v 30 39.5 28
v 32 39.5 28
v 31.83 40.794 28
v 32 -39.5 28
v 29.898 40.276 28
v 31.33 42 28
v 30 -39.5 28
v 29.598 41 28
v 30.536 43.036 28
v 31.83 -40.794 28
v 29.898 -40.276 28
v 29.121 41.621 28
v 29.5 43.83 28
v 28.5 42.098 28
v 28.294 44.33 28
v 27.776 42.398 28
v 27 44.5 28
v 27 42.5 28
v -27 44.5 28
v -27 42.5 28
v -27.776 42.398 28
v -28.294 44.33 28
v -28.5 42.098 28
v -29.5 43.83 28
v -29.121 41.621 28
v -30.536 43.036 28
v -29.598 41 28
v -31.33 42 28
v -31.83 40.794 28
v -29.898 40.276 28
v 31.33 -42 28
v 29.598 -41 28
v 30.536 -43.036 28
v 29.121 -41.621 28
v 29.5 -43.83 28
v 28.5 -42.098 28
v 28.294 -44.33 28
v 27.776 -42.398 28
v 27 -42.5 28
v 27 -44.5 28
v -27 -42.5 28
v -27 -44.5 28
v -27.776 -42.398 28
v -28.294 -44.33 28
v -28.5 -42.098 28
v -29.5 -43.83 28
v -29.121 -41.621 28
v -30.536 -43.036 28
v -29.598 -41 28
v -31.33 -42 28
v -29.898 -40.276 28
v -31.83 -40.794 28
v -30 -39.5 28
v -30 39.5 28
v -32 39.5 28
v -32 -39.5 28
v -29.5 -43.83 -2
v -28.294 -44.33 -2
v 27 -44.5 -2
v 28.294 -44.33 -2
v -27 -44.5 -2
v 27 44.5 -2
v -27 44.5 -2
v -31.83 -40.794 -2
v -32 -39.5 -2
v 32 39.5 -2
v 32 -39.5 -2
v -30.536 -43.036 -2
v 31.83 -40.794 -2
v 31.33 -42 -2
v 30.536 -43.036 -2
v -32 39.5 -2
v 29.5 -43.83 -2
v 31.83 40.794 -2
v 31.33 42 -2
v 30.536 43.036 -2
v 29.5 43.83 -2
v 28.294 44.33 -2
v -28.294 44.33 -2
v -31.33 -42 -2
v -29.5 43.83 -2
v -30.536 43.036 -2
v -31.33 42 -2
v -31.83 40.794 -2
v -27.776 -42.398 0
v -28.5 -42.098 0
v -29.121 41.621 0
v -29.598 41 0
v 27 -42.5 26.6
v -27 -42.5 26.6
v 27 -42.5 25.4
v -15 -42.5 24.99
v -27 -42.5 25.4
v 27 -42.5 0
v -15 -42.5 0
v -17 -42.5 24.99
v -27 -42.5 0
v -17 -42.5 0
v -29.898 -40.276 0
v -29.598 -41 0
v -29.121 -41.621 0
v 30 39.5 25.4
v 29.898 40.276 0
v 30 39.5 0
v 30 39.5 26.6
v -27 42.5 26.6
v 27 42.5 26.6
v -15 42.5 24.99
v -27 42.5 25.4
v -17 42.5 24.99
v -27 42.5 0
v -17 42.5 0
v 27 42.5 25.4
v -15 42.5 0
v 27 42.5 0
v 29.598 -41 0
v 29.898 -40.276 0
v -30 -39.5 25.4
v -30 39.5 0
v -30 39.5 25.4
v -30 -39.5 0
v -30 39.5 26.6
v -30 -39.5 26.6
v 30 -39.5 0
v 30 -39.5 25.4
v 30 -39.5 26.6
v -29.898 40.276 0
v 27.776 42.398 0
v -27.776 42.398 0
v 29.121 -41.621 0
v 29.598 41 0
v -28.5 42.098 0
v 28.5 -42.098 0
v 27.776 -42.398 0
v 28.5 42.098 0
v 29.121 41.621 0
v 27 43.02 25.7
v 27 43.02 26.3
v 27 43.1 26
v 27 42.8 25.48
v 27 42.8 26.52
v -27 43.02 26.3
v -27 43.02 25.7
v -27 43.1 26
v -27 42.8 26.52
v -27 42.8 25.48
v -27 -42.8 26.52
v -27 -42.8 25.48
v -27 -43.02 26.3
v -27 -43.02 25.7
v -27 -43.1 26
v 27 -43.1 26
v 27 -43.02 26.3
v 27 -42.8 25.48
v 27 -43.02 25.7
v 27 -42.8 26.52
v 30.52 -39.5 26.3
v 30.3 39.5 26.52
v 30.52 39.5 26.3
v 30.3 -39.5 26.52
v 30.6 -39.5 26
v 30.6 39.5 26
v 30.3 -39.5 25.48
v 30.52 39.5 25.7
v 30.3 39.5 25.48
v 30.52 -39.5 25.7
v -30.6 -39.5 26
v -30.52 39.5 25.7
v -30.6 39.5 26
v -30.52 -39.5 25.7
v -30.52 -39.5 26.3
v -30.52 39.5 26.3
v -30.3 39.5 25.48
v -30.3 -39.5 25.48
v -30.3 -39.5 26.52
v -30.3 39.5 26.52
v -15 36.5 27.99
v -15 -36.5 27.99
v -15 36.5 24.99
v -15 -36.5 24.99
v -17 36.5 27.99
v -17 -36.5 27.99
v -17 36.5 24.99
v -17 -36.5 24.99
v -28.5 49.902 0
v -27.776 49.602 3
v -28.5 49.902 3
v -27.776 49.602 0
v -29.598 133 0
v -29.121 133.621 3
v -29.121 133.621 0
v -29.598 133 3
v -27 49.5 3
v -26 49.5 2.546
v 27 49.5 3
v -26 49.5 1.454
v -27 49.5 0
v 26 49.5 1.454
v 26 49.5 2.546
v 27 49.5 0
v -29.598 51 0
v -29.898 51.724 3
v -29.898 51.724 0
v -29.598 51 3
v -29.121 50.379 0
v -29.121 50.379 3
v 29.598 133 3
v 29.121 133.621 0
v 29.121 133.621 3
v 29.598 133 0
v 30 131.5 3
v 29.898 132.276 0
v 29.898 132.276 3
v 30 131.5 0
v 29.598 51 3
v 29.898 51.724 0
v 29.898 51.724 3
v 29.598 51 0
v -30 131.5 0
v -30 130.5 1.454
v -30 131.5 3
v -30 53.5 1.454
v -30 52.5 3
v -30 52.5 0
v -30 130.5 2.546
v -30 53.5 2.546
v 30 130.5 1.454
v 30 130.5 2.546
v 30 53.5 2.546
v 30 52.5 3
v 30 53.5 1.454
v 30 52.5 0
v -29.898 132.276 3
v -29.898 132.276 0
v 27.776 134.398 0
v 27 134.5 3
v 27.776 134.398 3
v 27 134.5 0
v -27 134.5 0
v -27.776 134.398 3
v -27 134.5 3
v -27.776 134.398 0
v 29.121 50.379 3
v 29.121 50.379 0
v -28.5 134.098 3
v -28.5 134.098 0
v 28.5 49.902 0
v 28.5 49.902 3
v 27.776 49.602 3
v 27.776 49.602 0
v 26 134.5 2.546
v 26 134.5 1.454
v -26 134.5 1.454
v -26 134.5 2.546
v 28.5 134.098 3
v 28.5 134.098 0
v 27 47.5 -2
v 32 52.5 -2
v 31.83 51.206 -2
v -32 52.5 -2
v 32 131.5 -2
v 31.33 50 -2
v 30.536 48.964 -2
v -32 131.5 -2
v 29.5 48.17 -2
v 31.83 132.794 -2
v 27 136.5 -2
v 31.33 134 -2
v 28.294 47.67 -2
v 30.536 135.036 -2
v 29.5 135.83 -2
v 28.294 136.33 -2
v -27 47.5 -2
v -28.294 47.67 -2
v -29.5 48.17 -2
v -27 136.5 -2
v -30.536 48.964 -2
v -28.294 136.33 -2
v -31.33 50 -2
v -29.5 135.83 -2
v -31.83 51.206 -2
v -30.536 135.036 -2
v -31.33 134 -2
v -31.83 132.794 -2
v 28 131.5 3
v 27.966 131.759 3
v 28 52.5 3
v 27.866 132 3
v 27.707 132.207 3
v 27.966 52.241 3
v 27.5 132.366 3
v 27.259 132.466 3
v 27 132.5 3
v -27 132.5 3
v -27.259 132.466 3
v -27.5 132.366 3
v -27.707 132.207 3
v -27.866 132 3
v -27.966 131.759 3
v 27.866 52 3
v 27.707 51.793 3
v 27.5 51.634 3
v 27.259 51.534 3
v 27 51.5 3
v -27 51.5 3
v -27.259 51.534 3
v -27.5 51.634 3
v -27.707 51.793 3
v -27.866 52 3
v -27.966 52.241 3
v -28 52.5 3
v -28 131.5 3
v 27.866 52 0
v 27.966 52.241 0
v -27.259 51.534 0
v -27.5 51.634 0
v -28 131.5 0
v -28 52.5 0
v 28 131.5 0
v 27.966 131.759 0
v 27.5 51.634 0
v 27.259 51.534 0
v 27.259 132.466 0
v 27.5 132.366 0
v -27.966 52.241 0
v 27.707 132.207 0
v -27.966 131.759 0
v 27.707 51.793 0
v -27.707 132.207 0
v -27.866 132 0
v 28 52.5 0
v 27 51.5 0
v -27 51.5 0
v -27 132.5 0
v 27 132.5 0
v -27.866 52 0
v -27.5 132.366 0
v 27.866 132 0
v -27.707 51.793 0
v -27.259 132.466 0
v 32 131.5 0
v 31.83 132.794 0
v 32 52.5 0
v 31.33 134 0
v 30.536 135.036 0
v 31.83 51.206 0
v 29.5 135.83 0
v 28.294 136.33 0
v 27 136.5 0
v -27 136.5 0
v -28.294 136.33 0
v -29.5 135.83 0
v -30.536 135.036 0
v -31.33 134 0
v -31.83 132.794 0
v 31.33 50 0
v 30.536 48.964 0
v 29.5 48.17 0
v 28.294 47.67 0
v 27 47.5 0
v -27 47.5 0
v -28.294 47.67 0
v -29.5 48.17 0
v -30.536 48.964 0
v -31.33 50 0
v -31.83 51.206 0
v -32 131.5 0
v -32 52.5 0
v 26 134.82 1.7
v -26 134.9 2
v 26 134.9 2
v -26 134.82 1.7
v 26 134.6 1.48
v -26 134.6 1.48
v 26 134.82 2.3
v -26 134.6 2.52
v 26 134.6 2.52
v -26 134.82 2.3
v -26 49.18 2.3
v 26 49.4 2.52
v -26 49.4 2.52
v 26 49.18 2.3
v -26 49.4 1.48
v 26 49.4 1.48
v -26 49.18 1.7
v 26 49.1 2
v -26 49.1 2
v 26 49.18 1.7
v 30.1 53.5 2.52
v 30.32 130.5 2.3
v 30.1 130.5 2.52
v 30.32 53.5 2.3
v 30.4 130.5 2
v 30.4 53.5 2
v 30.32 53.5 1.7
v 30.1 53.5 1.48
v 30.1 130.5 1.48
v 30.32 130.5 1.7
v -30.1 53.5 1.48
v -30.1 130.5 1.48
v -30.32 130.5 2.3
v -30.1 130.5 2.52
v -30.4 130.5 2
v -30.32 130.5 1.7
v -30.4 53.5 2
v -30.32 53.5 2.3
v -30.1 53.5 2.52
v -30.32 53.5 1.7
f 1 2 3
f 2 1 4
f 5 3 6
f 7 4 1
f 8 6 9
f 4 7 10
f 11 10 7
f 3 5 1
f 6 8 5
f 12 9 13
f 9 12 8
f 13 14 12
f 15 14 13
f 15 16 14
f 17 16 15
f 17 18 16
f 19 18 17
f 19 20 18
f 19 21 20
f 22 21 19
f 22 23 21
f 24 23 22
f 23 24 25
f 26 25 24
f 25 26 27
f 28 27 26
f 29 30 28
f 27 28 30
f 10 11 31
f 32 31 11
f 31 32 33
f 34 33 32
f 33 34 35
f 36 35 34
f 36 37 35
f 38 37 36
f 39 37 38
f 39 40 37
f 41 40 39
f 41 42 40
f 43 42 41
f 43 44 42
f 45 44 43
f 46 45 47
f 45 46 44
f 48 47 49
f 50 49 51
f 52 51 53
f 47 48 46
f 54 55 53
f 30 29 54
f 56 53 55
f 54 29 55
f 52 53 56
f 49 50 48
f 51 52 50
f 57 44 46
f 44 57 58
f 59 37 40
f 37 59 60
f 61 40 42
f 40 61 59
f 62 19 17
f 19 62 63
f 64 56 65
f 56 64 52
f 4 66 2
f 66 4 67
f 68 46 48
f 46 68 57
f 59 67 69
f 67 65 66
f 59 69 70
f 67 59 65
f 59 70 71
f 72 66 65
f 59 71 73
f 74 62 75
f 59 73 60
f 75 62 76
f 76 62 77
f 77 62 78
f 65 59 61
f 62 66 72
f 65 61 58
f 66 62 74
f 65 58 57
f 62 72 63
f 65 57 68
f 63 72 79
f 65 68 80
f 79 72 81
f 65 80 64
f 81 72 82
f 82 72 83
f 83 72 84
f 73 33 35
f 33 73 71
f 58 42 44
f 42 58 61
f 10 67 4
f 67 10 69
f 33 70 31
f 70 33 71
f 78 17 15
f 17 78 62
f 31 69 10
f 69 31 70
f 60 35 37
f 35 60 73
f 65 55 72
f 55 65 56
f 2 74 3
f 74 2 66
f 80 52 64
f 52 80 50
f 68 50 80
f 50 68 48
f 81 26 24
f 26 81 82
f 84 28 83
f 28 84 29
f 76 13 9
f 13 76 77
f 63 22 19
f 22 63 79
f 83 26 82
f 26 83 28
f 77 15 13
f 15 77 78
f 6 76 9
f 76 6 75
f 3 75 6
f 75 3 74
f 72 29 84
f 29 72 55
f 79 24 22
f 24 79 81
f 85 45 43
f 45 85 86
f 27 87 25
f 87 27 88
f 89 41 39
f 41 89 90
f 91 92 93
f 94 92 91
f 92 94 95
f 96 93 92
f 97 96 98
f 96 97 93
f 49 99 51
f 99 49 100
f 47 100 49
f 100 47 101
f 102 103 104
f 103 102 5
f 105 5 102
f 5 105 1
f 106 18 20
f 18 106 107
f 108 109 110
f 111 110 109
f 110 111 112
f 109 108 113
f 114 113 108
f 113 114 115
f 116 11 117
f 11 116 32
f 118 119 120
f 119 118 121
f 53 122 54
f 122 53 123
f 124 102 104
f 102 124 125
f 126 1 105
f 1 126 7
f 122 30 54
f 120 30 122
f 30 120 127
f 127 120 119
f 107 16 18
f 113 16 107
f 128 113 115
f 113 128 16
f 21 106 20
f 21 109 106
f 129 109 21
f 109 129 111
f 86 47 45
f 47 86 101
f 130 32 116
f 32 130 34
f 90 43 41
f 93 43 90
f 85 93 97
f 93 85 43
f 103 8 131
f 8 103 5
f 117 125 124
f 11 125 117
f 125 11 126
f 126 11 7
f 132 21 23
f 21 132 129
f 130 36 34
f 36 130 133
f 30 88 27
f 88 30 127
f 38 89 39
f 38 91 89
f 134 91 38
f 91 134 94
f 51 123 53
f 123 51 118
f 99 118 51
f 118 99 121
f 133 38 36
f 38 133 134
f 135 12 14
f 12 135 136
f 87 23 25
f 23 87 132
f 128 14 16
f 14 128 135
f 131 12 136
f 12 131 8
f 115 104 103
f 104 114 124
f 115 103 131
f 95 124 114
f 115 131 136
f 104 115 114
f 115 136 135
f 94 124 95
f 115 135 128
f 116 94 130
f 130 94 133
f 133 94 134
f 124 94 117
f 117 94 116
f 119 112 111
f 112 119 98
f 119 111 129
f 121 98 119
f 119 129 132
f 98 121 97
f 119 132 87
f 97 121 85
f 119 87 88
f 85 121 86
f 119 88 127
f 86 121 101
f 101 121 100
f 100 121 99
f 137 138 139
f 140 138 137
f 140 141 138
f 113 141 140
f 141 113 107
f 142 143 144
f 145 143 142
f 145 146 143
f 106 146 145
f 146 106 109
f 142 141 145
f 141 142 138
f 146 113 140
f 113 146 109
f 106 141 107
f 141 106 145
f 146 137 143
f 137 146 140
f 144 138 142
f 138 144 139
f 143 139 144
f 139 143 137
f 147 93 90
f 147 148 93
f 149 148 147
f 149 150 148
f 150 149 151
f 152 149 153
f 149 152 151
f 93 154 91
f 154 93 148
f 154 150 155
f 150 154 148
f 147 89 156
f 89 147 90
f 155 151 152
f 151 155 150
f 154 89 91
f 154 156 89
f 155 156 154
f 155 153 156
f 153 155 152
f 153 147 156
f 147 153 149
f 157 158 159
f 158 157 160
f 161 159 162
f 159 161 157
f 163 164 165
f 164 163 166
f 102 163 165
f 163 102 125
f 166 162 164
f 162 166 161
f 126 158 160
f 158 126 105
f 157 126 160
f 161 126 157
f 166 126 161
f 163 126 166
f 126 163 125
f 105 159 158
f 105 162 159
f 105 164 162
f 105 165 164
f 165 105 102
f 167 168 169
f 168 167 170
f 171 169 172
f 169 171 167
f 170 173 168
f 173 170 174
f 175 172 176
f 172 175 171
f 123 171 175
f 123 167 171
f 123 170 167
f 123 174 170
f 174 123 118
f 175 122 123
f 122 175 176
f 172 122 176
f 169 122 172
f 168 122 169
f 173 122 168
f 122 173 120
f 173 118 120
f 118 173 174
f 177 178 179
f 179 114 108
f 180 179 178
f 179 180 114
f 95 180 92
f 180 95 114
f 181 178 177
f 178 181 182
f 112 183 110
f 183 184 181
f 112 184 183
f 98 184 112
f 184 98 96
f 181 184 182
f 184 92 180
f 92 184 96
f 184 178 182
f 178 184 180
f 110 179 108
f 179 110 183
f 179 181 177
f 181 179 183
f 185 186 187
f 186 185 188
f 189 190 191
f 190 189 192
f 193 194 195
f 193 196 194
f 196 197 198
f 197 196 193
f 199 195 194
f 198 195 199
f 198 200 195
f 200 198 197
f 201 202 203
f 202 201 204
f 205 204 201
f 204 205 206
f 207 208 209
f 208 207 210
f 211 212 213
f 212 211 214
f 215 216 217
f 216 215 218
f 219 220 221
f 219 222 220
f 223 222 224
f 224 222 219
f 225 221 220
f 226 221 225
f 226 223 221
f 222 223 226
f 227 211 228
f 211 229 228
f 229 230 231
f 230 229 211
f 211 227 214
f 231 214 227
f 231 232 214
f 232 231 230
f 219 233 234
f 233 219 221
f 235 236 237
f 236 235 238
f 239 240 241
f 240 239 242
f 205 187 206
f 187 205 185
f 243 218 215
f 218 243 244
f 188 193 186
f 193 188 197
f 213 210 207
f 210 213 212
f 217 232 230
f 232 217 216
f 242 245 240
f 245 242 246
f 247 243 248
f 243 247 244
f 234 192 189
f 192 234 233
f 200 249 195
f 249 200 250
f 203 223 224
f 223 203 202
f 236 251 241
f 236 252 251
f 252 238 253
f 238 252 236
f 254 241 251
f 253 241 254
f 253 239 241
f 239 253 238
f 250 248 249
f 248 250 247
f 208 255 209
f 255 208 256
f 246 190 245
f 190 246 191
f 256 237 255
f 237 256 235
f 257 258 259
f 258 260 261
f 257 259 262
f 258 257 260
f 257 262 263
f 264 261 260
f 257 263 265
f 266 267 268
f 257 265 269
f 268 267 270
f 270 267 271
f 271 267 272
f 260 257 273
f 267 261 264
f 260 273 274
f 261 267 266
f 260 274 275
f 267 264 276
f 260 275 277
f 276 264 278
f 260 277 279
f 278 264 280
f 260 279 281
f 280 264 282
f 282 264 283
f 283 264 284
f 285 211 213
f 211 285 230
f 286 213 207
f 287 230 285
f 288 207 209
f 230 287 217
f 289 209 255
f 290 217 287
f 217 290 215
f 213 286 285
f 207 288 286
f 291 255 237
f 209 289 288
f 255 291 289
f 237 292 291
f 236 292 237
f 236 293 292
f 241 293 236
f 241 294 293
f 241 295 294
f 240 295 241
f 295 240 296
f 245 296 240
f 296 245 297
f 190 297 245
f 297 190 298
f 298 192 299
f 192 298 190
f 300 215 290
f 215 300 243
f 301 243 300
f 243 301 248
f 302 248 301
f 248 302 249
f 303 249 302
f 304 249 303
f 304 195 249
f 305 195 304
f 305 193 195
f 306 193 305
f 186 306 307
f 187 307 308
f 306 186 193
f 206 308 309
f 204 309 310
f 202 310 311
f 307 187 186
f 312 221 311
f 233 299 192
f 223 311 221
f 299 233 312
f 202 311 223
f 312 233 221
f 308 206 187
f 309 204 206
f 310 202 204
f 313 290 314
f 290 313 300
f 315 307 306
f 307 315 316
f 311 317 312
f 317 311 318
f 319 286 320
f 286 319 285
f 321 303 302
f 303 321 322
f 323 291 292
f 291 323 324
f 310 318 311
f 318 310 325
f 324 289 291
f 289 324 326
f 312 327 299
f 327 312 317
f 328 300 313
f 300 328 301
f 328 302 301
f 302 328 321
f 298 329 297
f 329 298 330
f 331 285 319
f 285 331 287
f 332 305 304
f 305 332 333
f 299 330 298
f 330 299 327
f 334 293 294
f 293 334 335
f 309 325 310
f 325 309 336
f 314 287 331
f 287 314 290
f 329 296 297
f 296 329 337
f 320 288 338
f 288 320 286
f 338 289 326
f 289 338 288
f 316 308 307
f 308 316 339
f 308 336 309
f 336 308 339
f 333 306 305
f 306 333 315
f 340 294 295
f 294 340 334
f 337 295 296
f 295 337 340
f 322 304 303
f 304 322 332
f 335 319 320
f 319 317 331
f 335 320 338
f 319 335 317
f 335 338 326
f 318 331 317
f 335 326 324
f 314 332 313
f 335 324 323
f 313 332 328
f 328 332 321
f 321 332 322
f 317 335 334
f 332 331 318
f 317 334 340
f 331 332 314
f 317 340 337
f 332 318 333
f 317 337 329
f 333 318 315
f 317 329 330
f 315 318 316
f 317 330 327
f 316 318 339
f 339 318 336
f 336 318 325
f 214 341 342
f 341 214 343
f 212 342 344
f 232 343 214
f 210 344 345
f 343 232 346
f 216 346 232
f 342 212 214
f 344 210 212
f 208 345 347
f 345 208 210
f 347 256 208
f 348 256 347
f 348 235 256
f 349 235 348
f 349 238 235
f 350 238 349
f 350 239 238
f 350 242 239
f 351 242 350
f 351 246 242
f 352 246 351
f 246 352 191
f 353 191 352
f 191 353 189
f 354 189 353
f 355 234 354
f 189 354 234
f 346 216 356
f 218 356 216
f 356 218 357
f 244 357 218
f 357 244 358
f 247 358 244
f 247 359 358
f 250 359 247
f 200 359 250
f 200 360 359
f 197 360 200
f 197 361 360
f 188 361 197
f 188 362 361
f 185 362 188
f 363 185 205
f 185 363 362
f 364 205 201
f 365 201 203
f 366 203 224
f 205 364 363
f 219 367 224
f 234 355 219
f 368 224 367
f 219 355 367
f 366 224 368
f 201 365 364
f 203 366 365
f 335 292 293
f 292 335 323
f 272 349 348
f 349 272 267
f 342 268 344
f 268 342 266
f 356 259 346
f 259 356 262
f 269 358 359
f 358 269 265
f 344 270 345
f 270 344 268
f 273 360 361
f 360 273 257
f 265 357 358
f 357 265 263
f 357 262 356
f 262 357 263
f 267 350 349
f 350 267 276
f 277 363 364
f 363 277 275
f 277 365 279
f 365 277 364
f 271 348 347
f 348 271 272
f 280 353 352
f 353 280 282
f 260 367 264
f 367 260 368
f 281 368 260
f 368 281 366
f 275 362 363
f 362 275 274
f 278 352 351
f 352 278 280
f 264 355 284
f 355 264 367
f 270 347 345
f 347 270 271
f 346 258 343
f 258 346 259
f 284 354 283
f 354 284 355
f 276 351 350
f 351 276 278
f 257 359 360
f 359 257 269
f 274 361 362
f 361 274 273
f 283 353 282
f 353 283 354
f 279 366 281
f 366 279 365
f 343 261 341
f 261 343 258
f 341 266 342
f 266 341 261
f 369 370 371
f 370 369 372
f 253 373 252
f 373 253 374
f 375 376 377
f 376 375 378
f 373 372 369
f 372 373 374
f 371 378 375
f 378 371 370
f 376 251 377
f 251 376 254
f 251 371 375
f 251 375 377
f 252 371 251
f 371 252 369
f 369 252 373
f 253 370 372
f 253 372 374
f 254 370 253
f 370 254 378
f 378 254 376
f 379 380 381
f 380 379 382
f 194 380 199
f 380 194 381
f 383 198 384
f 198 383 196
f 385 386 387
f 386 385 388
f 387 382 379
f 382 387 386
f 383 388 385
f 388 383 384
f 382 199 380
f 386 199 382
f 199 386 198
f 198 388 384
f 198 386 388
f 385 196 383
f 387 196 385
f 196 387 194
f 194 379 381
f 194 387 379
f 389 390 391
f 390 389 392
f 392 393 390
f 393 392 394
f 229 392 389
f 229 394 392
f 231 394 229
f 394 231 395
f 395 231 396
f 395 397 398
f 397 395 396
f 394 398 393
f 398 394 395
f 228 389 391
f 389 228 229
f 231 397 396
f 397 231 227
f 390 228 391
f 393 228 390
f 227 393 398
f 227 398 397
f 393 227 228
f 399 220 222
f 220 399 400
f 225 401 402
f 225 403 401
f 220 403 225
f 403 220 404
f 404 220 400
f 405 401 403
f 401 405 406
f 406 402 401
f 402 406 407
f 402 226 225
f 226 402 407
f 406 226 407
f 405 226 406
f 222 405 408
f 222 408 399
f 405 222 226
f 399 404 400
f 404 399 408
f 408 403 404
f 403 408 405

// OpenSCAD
// V 1.2 Correction / hint from molotok3D, some minor fixes
// V 1.1- added opening helper and an optional separating wall

wi=60;	// inner width, length & heigth
li=85;
h=28;
th=2;	// wall thickness
r=3;	// radius of rounded corners
opening_help=false;	// make a gap to ease opening of the cover, f.ex.
		// with a coin - girls are afraid of their finger nails ;-)
separator=13;	// generate a separating wall inside - set to 0 for none

e=0.01;
ri=(r>th)?r-th:e;	// needed for the cover - needs to be larger than 0 for proper results
l=li-2*r;
w=wi-2*r;

module box(){
	difference(){
		translate([0,0,-th])hull(){
			for (i=[[-w/2,-l/2],[-w/2,l/2],[w/2,-l/2],[w/2,l/2]]){
				translate(i)cylinder(r=r+th,h=h+th,$fn=8*r);
			}
		}
		hull(){
			for (i=[[-w/2,-l/2],[-w/2,l/2,],[w/2,-l/2],[w/2,l/2]]){
				translate(i)cylinder(r=r,h=h,$fn=8*r);
			}
		}
		translate([-w/2,l/2+r,h-2])rotate([0,90,0])cylinder(d=1.2,h=w,$fn=12);
		translate([-w/2,-l/2-r,h-2])rotate([0,90,0])cylinder(d=1.2,h=w,$fn=12);
		translate([w/2+r,l/2,h-2])rotate([90,0,0])cylinder(d=1.2,h=l,$fn=12);
		translate([-w/2-r,l/2,h-2])rotate([90,0,0])cylinder(d=1.2,h=l,$fn=12);

		// if you need some adjustment for the opening helper size or position,
		// this is the right place
		if (opening_help)translate([w/2-10,l/2+13.5,h-1.8])cylinder(d=20,h=10,$fn=32);
	}
	if (separator>0){
		translate([separator-wi/2,-li/2-e,-e])difference(){
			cube([th,li+2*e,h]);
			translate([-e,-e,h-3])cube([th+2*e,2*th+2+2*e,5]);
			translate([-e,e+li-2*th-2,h-3])cube([th+2+2*e,2*th+2+2*e,5]);
		}
	}
}

module cover(){
	translate([0,0,-th])hull(){
		for (i=[[-w/2,-l/2],[-w/2,l/2],[w/2,-l/2],[w/2,l/2]]){
			translate(i)cylinder(r=r+th,h=th,$fn=8*r);
		}
	}
	difference(){
		translate([0,0,-th])hull(){
			for (i=[[-w/2,-l/2],[-w/2,l/2],[w/2,-l/2],[w/2,l/2]]){
				translate(i)cylinder(r=r,h=th+3,$fn=8*r);
			}
		}
		hull(){
			for (i=[[-w/2,-l/2],[-w/2,l/2],[w/2,-l/2],[w/2,l/2]]){
				if (r>th){
					translate(i)cylinder(r=r-th,h=3,$fn=8*r);
				}else{
					translate(i)cylinder(r=e,h=3,$fn=8*r);
				}
			}
		}
	}
	translate([-w/2+1,l/2+r-0.2,2])rotate([0,90,0])cylinder(d=1.2,h=w-2,$fn=12);
	translate([-w/2+1,-l/2-r+0.2,2])rotate([0,90,0])cylinder(d=1.2,h=w-2,$fn=12);
	translate([w/2+r-0.2,l/2-1,2])rotate([90,0,0])cylinder(d=1.2,h=l-2,$fn=12);
	translate([-w/2-r+0.2,l/2-1,2])rotate([90,0,0])cylinder(d=1.2,h=l-2,$fn=12);

}

box();
translate([0,li+3+2*th,0])
	cover();
